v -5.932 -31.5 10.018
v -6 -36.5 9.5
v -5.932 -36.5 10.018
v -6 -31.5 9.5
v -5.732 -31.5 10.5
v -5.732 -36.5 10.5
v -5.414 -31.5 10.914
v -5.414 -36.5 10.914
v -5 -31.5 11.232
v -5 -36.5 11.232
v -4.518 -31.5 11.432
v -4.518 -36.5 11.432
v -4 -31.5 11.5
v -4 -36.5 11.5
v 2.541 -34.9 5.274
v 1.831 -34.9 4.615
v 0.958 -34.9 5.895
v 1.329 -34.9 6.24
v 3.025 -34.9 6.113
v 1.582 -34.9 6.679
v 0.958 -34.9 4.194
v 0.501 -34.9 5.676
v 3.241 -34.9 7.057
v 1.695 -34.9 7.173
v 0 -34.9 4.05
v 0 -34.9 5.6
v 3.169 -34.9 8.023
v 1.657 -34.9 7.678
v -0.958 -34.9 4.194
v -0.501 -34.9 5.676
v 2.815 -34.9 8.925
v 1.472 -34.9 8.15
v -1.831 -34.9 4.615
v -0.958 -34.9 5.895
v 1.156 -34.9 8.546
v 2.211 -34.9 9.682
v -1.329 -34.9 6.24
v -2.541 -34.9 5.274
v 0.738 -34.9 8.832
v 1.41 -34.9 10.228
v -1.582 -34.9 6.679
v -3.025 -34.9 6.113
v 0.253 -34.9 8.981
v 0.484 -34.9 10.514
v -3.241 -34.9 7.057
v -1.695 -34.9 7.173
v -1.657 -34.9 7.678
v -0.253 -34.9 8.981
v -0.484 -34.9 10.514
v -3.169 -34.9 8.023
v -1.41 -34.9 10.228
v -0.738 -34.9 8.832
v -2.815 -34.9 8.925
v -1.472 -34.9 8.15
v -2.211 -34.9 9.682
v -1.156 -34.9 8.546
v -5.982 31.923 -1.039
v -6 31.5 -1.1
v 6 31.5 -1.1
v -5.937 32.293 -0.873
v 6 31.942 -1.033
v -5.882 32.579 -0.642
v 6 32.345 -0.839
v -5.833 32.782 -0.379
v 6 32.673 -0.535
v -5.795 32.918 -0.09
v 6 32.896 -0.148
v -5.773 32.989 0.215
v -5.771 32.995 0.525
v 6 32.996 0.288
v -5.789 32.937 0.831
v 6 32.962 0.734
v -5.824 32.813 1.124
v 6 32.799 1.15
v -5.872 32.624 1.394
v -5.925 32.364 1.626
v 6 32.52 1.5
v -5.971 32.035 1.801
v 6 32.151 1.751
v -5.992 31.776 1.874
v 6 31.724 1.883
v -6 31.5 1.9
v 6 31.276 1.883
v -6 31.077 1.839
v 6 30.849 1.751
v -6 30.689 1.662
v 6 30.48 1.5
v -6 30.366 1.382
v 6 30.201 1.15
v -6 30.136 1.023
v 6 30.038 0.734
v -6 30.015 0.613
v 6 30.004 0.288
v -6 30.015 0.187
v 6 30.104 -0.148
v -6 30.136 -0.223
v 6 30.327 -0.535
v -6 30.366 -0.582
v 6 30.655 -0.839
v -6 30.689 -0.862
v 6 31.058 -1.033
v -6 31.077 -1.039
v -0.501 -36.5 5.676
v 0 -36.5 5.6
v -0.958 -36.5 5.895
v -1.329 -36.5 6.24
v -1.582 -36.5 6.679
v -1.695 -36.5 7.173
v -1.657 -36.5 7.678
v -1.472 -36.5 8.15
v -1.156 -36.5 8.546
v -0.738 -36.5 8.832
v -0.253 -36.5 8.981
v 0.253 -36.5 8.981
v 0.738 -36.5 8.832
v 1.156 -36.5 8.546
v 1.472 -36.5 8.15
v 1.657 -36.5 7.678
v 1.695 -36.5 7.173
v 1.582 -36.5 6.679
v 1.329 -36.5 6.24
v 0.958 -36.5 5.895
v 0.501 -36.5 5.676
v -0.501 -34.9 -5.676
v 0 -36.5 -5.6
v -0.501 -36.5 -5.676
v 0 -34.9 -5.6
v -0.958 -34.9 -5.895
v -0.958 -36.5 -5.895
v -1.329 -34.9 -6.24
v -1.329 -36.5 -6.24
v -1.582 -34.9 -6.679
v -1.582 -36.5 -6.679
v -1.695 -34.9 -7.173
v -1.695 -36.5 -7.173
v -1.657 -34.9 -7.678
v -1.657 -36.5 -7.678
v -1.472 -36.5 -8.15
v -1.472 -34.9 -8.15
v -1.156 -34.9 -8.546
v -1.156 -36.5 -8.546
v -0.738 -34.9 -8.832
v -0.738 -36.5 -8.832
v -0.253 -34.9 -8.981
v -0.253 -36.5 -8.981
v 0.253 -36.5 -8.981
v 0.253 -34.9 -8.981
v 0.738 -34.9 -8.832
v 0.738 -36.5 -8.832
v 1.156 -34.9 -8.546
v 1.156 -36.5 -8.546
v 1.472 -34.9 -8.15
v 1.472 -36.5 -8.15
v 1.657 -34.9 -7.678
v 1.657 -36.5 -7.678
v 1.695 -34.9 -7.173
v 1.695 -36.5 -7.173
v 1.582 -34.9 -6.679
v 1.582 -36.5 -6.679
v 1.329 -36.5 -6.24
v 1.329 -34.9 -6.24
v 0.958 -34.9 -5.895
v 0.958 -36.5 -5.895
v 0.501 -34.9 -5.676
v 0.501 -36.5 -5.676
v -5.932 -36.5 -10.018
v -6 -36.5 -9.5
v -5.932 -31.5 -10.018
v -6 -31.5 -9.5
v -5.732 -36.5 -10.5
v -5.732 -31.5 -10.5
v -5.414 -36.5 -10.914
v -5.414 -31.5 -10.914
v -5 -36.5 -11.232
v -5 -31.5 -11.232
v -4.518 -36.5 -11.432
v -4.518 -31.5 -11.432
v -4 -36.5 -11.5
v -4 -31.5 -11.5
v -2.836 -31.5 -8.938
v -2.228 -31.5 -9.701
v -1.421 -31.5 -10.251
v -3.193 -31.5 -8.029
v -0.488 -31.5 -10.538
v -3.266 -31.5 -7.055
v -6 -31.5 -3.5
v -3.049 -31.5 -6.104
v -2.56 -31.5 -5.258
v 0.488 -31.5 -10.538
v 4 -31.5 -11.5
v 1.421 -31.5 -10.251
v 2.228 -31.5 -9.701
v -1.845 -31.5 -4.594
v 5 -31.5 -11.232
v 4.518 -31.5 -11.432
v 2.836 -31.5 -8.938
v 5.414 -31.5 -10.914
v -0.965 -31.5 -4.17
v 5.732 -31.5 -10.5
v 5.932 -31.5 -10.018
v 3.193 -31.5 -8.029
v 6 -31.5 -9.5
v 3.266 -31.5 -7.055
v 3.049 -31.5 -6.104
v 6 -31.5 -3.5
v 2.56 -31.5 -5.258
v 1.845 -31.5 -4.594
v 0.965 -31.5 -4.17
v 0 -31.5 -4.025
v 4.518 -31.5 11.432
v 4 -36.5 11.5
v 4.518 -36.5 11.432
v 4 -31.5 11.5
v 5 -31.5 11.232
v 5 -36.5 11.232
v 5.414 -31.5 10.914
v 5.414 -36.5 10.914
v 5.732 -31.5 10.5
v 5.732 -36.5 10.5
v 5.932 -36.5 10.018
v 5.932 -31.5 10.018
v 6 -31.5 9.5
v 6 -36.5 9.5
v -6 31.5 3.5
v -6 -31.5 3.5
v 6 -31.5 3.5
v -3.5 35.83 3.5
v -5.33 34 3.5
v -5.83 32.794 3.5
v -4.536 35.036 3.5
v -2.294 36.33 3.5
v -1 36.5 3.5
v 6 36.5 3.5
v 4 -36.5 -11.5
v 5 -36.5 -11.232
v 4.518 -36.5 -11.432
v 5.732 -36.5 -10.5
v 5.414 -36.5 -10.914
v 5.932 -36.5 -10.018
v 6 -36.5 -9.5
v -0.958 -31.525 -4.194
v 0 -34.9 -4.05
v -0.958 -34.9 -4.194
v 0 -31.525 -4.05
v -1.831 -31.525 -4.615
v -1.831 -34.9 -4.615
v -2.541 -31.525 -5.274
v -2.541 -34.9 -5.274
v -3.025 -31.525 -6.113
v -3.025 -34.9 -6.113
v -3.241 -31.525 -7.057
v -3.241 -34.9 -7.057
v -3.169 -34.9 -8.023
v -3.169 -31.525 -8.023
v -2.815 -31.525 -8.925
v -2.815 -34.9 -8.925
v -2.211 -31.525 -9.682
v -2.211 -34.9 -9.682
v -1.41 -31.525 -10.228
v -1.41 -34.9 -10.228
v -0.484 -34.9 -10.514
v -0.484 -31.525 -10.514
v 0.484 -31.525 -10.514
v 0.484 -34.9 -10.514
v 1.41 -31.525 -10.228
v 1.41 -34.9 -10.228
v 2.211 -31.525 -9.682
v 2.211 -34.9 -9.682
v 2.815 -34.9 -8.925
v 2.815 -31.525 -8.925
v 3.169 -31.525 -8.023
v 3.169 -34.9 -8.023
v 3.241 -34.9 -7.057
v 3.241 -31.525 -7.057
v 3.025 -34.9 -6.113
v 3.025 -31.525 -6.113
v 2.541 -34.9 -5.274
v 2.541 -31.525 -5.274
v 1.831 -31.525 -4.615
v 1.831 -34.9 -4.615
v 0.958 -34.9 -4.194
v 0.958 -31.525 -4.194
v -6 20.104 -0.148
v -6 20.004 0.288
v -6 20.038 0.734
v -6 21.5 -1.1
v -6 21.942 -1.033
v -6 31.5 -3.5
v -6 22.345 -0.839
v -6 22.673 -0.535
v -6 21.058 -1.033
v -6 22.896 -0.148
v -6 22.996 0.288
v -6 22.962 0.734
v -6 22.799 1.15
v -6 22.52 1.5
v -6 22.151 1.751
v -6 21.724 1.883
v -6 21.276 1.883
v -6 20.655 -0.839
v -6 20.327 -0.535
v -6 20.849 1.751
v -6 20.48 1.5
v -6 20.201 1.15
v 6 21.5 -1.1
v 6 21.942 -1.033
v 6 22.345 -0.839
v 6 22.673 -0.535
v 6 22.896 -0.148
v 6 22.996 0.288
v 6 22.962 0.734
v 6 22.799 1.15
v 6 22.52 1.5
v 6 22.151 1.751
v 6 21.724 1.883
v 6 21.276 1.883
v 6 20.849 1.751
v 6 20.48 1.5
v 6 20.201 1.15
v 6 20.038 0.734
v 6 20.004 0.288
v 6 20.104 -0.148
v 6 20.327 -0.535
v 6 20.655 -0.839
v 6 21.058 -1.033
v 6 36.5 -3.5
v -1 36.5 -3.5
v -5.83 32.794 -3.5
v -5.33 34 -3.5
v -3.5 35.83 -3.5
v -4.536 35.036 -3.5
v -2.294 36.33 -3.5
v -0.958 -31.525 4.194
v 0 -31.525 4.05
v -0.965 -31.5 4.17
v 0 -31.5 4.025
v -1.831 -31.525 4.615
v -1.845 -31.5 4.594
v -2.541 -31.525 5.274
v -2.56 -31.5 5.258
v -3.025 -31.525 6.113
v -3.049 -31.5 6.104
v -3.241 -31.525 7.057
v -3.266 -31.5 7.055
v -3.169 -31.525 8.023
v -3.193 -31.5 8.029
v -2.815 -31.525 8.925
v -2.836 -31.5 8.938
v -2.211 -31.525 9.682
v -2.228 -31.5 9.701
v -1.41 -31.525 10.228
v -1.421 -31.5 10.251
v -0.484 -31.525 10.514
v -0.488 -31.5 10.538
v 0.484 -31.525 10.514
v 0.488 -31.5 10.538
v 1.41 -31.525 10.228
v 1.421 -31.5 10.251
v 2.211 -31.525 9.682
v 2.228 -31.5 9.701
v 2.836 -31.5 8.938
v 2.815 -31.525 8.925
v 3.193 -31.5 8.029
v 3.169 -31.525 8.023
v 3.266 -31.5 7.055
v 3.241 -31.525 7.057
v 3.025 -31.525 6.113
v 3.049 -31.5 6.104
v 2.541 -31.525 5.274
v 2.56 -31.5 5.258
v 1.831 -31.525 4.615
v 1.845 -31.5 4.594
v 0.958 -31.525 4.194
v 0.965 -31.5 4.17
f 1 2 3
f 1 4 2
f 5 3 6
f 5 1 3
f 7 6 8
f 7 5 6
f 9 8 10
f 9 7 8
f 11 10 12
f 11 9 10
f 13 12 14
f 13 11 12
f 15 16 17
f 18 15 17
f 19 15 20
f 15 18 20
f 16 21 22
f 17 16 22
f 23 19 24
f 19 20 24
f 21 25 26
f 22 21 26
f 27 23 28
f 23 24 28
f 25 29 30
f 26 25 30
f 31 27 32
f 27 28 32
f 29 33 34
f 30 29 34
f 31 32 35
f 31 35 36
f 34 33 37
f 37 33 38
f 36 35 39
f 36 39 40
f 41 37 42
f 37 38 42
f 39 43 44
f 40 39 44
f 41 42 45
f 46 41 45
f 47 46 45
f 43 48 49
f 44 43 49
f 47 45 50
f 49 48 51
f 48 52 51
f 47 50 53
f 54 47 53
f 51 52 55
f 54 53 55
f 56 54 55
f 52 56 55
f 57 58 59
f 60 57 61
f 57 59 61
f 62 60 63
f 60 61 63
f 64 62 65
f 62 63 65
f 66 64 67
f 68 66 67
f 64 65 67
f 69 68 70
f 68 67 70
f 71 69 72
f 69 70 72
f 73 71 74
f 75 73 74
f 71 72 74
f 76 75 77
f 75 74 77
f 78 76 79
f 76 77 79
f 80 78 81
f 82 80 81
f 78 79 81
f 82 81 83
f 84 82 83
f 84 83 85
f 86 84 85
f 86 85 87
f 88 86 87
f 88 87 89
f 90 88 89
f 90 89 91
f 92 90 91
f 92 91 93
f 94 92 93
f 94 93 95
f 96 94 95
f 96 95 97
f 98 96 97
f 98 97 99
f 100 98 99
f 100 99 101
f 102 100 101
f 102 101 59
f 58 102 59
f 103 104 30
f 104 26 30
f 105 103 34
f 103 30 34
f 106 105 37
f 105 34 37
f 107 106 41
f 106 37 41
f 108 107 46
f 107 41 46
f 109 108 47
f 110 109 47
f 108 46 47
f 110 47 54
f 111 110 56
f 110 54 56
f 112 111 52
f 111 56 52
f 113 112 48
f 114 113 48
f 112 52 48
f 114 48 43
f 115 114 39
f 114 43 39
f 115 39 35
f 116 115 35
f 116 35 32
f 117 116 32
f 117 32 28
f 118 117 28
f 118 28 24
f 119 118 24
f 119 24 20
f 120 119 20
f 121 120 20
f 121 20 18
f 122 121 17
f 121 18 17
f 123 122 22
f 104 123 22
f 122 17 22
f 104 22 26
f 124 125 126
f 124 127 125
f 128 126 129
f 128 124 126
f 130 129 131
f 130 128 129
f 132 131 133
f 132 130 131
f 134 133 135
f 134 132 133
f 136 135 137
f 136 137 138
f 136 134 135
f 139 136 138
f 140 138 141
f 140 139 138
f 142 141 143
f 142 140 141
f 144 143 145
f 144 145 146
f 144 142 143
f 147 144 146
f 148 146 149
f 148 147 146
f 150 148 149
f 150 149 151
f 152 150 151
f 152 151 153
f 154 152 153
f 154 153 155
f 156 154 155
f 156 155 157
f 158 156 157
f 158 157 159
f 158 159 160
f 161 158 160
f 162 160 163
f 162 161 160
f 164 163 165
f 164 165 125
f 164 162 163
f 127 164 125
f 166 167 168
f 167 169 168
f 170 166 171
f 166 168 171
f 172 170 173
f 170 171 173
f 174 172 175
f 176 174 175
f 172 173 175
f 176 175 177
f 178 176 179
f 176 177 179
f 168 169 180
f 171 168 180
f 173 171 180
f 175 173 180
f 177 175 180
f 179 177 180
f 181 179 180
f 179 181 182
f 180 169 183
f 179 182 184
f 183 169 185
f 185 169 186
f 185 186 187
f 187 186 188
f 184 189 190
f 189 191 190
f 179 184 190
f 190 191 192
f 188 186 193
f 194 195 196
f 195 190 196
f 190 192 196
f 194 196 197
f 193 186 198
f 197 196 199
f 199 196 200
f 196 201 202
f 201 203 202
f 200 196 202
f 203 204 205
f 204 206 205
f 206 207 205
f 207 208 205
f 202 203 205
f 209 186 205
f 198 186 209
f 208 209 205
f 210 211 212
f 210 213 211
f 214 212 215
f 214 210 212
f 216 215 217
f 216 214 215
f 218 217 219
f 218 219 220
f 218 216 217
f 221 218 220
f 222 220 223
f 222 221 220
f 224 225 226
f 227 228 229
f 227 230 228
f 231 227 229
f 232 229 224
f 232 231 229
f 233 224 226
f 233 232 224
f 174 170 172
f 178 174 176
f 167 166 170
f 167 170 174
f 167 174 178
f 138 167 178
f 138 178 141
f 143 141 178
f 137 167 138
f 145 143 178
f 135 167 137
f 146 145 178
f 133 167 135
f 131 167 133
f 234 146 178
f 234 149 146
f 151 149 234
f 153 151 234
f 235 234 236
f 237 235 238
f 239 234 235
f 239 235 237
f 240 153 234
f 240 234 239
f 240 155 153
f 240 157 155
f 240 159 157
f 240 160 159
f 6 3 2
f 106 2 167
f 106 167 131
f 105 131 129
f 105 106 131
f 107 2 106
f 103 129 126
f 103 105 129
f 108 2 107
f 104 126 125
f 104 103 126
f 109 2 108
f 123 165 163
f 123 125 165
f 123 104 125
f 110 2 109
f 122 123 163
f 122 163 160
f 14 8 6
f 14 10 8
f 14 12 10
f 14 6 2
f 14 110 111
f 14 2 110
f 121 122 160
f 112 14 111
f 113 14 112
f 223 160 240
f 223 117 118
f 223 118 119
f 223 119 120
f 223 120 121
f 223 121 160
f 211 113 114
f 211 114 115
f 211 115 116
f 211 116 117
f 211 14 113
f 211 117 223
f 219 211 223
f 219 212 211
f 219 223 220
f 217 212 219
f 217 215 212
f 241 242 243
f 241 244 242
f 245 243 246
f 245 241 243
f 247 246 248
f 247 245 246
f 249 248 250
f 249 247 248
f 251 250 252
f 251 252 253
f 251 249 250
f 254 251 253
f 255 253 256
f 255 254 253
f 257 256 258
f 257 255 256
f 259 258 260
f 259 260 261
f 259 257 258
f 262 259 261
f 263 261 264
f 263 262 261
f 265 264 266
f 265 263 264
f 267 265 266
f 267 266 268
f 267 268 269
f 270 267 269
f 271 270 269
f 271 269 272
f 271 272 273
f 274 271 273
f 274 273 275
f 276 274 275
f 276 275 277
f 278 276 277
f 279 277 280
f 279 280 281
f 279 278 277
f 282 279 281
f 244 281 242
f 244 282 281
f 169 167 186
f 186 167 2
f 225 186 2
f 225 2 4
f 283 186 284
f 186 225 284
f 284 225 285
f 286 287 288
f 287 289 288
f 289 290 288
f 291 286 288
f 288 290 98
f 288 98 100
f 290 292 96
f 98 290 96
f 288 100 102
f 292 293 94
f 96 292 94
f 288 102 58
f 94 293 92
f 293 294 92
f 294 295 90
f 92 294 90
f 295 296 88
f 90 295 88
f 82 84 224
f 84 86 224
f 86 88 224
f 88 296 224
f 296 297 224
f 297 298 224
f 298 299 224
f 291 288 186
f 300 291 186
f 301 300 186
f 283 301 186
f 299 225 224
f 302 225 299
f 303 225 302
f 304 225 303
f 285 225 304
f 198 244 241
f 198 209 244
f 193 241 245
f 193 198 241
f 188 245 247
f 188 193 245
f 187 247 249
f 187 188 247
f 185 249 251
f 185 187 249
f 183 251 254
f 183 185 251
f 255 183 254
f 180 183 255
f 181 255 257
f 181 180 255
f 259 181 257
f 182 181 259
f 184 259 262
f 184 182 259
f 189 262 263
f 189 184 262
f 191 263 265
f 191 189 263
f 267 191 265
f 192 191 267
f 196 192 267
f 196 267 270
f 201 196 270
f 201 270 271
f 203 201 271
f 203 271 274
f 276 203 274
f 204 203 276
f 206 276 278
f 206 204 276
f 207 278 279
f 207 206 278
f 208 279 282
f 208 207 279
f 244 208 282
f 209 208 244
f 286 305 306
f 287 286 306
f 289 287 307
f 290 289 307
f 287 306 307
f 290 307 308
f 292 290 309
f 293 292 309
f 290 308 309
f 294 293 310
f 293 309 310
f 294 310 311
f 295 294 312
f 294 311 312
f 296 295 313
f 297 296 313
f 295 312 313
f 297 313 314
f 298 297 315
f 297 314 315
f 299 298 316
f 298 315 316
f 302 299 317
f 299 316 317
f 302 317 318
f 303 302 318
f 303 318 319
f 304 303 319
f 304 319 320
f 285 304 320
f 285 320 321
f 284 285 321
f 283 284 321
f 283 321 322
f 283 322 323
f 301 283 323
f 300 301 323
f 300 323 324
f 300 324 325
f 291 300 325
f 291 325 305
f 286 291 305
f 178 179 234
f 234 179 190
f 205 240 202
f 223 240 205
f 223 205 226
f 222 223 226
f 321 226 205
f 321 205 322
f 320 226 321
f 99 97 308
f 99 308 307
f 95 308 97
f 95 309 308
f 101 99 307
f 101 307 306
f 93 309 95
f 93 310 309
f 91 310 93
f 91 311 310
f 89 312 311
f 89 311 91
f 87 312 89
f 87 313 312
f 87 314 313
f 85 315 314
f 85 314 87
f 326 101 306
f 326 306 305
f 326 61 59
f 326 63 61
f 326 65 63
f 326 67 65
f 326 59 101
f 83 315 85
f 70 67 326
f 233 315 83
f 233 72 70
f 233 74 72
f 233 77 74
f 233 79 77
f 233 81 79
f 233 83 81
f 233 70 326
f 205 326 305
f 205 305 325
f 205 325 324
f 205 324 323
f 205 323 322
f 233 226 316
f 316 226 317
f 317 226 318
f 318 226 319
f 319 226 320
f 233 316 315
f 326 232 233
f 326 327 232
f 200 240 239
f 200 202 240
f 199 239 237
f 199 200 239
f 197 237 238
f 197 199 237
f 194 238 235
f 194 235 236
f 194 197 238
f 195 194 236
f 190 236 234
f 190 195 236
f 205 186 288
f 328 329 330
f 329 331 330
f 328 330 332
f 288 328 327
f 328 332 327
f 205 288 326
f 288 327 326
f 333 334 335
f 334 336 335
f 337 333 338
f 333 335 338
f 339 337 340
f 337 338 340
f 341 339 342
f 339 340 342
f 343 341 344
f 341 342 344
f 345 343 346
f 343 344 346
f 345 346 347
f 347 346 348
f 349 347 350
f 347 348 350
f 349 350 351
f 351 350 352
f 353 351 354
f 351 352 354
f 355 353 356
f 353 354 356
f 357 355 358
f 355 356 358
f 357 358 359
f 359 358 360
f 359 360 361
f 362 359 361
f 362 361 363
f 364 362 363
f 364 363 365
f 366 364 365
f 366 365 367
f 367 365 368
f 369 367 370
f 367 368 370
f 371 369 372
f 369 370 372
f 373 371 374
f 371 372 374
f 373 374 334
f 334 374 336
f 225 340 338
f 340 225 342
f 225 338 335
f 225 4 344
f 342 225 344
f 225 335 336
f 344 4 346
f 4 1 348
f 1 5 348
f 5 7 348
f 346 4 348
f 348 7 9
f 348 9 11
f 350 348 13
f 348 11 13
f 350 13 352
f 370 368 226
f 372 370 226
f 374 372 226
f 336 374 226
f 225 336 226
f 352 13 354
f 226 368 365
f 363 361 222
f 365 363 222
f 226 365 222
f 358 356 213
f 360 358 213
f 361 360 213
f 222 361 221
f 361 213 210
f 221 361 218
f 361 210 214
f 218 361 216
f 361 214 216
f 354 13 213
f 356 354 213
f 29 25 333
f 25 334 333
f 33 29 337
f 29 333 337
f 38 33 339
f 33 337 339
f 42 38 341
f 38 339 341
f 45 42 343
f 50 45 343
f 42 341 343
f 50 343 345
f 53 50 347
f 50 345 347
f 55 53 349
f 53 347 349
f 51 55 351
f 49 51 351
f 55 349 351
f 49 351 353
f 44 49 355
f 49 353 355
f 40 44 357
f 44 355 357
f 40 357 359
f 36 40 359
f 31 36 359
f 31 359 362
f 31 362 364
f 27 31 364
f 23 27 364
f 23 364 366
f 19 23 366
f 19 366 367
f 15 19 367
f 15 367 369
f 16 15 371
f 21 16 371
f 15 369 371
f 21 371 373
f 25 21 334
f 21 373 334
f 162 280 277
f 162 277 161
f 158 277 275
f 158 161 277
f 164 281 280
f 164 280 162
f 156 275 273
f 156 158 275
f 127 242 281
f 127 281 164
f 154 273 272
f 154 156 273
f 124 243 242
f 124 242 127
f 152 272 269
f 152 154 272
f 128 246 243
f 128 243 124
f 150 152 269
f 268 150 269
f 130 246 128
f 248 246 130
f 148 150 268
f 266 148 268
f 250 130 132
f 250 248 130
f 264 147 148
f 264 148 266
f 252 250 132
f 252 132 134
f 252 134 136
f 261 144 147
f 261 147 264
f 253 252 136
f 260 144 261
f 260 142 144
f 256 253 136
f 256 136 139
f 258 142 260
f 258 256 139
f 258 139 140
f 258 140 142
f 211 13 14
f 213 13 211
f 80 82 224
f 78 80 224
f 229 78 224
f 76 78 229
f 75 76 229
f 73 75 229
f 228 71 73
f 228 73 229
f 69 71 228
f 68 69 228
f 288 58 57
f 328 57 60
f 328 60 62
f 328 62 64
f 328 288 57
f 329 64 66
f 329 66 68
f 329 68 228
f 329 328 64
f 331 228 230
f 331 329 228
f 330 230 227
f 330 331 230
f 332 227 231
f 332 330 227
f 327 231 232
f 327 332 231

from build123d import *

# Parameters (mm, degrees)
SKETCH1_W           = 12
SKETCH1_H           = 7
BOSS_EXTRUDE1_DEPTH = 36.5
SKETCH3_W           = 12
SKETCH3_H           = 5
BOSS_EXTRUDE2_DEPTH = 11.5
FILLET1_R           = 2
FILLET2_R           = 5
CUT_EXTRUDE1_REACH  = 14
SKETCH7_R           = 1.5


with BuildPart() as part:
    # Sketch1 → Boss-Extrude1 (new body, symmetric)
    with BuildSketch(Plane(origin=(0, 0, 0), x_dir=(1, 0, 0), z_dir=(0, 1, 0))):
        Rectangle(SKETCH1_W, SKETCH1_H)
    extrude(amount=BOSS_EXTRUDE1_DEPTH, both=True)

    # Sketch3 → Boss-Extrude2 (add, symmetric)
    with BuildSketch(Plane.XY):
        with Locations((0, -34)):
            Rectangle(SKETCH3_W, SKETCH3_H)
    extrude(amount=BOSS_EXTRUDE2_DEPTH, both=True)

    # Fillet1
    fillet1_edges = [part.edges().sort_by_distance(p)[0] for p in [
        (-6, -34, -11.5),
        (6, -34, -11.5),
        (-6, -34, 11.5),
        (6, -34, 11.5),
    ]]
    fillet(fillet1_edges, radius=FILLET1_R)

    # Sketch6 → CBORE for M3 Hex Socket Head Cap Screw1 (revolve, cut)
    with BuildSketch(Plane(origin=(0, -31.5, -7.3), x_dir=(0, 0, 1), z_dir=(1, 0, 0))):
        Polygon((0, 0), (0, 5), (1.7, 5), (1.7, 3.4), (3.25, 3.4), (3.25, 0.025), (3.275, 0), align=None)
    cbore_for_m3_hex_socket_head_cap_screw1 = revolve(axis=Axis((0, -25.15, -7.3), (0, -1, 0)), mode=Mode.SUBTRACT)

    # Mirror1: CBORE for M3 Hex Socket Head Cap Screw1 across plane
    add(cbore_for_m3_hex_socket_head_cap_screw1.mirror(Plane.XY), mode=Mode.SUBTRACT)

    # Fillet2
    fillet2_edges = [part.edges().sort_by_distance(p)[0] for p in [
        (-6, 36.5, 0),
    ]]
    fillet(fillet2_edges, radius=FILLET2_R)

    # Sketch7 → Cut-Extrude1 (cut, up to next)
    with BuildSketch(Plane(origin=(6, 0, 0), x_dir=(0, 0, -1), z_dir=(1, 0, 0)), mode=Mode.PRIVATE) as cut_extrude1_sk1:
        with Locations((-0.4, 31.5)):
            Circle(SKETCH7_R)
    cut_extrude1_tool1 = extrude(cut_extrude1_sk1.sketch, amount=-CUT_EXTRUDE1_REACH, mode=Mode.PRIVATE) & part.part
    add(cut_extrude1_tool1.solids().sort_by_distance((6, 31.5, 0.4))[0], mode=Mode.SUBTRACT)
    # Sketch7 → Cut-Extrude1 (cut, up to next)
    with BuildSketch(Plane(origin=(6, 0, 0), x_dir=(0, 0, -1), z_dir=(1, 0, 0)), mode=Mode.PRIVATE) as cut_extrude1_sk2:
        with Locations((-0.4, 21.5)):
            Circle(SKETCH7_R)
    cut_extrude1_tool2 = extrude(cut_extrude1_sk2.sketch, amount=-CUT_EXTRUDE1_REACH, mode=Mode.PRIVATE) & part.part
    add(cut_extrude1_tool2.solids().sort_by_distance((6, 21.5, 0.4))[0], mode=Mode.SUBTRACT)


solid = part.part
